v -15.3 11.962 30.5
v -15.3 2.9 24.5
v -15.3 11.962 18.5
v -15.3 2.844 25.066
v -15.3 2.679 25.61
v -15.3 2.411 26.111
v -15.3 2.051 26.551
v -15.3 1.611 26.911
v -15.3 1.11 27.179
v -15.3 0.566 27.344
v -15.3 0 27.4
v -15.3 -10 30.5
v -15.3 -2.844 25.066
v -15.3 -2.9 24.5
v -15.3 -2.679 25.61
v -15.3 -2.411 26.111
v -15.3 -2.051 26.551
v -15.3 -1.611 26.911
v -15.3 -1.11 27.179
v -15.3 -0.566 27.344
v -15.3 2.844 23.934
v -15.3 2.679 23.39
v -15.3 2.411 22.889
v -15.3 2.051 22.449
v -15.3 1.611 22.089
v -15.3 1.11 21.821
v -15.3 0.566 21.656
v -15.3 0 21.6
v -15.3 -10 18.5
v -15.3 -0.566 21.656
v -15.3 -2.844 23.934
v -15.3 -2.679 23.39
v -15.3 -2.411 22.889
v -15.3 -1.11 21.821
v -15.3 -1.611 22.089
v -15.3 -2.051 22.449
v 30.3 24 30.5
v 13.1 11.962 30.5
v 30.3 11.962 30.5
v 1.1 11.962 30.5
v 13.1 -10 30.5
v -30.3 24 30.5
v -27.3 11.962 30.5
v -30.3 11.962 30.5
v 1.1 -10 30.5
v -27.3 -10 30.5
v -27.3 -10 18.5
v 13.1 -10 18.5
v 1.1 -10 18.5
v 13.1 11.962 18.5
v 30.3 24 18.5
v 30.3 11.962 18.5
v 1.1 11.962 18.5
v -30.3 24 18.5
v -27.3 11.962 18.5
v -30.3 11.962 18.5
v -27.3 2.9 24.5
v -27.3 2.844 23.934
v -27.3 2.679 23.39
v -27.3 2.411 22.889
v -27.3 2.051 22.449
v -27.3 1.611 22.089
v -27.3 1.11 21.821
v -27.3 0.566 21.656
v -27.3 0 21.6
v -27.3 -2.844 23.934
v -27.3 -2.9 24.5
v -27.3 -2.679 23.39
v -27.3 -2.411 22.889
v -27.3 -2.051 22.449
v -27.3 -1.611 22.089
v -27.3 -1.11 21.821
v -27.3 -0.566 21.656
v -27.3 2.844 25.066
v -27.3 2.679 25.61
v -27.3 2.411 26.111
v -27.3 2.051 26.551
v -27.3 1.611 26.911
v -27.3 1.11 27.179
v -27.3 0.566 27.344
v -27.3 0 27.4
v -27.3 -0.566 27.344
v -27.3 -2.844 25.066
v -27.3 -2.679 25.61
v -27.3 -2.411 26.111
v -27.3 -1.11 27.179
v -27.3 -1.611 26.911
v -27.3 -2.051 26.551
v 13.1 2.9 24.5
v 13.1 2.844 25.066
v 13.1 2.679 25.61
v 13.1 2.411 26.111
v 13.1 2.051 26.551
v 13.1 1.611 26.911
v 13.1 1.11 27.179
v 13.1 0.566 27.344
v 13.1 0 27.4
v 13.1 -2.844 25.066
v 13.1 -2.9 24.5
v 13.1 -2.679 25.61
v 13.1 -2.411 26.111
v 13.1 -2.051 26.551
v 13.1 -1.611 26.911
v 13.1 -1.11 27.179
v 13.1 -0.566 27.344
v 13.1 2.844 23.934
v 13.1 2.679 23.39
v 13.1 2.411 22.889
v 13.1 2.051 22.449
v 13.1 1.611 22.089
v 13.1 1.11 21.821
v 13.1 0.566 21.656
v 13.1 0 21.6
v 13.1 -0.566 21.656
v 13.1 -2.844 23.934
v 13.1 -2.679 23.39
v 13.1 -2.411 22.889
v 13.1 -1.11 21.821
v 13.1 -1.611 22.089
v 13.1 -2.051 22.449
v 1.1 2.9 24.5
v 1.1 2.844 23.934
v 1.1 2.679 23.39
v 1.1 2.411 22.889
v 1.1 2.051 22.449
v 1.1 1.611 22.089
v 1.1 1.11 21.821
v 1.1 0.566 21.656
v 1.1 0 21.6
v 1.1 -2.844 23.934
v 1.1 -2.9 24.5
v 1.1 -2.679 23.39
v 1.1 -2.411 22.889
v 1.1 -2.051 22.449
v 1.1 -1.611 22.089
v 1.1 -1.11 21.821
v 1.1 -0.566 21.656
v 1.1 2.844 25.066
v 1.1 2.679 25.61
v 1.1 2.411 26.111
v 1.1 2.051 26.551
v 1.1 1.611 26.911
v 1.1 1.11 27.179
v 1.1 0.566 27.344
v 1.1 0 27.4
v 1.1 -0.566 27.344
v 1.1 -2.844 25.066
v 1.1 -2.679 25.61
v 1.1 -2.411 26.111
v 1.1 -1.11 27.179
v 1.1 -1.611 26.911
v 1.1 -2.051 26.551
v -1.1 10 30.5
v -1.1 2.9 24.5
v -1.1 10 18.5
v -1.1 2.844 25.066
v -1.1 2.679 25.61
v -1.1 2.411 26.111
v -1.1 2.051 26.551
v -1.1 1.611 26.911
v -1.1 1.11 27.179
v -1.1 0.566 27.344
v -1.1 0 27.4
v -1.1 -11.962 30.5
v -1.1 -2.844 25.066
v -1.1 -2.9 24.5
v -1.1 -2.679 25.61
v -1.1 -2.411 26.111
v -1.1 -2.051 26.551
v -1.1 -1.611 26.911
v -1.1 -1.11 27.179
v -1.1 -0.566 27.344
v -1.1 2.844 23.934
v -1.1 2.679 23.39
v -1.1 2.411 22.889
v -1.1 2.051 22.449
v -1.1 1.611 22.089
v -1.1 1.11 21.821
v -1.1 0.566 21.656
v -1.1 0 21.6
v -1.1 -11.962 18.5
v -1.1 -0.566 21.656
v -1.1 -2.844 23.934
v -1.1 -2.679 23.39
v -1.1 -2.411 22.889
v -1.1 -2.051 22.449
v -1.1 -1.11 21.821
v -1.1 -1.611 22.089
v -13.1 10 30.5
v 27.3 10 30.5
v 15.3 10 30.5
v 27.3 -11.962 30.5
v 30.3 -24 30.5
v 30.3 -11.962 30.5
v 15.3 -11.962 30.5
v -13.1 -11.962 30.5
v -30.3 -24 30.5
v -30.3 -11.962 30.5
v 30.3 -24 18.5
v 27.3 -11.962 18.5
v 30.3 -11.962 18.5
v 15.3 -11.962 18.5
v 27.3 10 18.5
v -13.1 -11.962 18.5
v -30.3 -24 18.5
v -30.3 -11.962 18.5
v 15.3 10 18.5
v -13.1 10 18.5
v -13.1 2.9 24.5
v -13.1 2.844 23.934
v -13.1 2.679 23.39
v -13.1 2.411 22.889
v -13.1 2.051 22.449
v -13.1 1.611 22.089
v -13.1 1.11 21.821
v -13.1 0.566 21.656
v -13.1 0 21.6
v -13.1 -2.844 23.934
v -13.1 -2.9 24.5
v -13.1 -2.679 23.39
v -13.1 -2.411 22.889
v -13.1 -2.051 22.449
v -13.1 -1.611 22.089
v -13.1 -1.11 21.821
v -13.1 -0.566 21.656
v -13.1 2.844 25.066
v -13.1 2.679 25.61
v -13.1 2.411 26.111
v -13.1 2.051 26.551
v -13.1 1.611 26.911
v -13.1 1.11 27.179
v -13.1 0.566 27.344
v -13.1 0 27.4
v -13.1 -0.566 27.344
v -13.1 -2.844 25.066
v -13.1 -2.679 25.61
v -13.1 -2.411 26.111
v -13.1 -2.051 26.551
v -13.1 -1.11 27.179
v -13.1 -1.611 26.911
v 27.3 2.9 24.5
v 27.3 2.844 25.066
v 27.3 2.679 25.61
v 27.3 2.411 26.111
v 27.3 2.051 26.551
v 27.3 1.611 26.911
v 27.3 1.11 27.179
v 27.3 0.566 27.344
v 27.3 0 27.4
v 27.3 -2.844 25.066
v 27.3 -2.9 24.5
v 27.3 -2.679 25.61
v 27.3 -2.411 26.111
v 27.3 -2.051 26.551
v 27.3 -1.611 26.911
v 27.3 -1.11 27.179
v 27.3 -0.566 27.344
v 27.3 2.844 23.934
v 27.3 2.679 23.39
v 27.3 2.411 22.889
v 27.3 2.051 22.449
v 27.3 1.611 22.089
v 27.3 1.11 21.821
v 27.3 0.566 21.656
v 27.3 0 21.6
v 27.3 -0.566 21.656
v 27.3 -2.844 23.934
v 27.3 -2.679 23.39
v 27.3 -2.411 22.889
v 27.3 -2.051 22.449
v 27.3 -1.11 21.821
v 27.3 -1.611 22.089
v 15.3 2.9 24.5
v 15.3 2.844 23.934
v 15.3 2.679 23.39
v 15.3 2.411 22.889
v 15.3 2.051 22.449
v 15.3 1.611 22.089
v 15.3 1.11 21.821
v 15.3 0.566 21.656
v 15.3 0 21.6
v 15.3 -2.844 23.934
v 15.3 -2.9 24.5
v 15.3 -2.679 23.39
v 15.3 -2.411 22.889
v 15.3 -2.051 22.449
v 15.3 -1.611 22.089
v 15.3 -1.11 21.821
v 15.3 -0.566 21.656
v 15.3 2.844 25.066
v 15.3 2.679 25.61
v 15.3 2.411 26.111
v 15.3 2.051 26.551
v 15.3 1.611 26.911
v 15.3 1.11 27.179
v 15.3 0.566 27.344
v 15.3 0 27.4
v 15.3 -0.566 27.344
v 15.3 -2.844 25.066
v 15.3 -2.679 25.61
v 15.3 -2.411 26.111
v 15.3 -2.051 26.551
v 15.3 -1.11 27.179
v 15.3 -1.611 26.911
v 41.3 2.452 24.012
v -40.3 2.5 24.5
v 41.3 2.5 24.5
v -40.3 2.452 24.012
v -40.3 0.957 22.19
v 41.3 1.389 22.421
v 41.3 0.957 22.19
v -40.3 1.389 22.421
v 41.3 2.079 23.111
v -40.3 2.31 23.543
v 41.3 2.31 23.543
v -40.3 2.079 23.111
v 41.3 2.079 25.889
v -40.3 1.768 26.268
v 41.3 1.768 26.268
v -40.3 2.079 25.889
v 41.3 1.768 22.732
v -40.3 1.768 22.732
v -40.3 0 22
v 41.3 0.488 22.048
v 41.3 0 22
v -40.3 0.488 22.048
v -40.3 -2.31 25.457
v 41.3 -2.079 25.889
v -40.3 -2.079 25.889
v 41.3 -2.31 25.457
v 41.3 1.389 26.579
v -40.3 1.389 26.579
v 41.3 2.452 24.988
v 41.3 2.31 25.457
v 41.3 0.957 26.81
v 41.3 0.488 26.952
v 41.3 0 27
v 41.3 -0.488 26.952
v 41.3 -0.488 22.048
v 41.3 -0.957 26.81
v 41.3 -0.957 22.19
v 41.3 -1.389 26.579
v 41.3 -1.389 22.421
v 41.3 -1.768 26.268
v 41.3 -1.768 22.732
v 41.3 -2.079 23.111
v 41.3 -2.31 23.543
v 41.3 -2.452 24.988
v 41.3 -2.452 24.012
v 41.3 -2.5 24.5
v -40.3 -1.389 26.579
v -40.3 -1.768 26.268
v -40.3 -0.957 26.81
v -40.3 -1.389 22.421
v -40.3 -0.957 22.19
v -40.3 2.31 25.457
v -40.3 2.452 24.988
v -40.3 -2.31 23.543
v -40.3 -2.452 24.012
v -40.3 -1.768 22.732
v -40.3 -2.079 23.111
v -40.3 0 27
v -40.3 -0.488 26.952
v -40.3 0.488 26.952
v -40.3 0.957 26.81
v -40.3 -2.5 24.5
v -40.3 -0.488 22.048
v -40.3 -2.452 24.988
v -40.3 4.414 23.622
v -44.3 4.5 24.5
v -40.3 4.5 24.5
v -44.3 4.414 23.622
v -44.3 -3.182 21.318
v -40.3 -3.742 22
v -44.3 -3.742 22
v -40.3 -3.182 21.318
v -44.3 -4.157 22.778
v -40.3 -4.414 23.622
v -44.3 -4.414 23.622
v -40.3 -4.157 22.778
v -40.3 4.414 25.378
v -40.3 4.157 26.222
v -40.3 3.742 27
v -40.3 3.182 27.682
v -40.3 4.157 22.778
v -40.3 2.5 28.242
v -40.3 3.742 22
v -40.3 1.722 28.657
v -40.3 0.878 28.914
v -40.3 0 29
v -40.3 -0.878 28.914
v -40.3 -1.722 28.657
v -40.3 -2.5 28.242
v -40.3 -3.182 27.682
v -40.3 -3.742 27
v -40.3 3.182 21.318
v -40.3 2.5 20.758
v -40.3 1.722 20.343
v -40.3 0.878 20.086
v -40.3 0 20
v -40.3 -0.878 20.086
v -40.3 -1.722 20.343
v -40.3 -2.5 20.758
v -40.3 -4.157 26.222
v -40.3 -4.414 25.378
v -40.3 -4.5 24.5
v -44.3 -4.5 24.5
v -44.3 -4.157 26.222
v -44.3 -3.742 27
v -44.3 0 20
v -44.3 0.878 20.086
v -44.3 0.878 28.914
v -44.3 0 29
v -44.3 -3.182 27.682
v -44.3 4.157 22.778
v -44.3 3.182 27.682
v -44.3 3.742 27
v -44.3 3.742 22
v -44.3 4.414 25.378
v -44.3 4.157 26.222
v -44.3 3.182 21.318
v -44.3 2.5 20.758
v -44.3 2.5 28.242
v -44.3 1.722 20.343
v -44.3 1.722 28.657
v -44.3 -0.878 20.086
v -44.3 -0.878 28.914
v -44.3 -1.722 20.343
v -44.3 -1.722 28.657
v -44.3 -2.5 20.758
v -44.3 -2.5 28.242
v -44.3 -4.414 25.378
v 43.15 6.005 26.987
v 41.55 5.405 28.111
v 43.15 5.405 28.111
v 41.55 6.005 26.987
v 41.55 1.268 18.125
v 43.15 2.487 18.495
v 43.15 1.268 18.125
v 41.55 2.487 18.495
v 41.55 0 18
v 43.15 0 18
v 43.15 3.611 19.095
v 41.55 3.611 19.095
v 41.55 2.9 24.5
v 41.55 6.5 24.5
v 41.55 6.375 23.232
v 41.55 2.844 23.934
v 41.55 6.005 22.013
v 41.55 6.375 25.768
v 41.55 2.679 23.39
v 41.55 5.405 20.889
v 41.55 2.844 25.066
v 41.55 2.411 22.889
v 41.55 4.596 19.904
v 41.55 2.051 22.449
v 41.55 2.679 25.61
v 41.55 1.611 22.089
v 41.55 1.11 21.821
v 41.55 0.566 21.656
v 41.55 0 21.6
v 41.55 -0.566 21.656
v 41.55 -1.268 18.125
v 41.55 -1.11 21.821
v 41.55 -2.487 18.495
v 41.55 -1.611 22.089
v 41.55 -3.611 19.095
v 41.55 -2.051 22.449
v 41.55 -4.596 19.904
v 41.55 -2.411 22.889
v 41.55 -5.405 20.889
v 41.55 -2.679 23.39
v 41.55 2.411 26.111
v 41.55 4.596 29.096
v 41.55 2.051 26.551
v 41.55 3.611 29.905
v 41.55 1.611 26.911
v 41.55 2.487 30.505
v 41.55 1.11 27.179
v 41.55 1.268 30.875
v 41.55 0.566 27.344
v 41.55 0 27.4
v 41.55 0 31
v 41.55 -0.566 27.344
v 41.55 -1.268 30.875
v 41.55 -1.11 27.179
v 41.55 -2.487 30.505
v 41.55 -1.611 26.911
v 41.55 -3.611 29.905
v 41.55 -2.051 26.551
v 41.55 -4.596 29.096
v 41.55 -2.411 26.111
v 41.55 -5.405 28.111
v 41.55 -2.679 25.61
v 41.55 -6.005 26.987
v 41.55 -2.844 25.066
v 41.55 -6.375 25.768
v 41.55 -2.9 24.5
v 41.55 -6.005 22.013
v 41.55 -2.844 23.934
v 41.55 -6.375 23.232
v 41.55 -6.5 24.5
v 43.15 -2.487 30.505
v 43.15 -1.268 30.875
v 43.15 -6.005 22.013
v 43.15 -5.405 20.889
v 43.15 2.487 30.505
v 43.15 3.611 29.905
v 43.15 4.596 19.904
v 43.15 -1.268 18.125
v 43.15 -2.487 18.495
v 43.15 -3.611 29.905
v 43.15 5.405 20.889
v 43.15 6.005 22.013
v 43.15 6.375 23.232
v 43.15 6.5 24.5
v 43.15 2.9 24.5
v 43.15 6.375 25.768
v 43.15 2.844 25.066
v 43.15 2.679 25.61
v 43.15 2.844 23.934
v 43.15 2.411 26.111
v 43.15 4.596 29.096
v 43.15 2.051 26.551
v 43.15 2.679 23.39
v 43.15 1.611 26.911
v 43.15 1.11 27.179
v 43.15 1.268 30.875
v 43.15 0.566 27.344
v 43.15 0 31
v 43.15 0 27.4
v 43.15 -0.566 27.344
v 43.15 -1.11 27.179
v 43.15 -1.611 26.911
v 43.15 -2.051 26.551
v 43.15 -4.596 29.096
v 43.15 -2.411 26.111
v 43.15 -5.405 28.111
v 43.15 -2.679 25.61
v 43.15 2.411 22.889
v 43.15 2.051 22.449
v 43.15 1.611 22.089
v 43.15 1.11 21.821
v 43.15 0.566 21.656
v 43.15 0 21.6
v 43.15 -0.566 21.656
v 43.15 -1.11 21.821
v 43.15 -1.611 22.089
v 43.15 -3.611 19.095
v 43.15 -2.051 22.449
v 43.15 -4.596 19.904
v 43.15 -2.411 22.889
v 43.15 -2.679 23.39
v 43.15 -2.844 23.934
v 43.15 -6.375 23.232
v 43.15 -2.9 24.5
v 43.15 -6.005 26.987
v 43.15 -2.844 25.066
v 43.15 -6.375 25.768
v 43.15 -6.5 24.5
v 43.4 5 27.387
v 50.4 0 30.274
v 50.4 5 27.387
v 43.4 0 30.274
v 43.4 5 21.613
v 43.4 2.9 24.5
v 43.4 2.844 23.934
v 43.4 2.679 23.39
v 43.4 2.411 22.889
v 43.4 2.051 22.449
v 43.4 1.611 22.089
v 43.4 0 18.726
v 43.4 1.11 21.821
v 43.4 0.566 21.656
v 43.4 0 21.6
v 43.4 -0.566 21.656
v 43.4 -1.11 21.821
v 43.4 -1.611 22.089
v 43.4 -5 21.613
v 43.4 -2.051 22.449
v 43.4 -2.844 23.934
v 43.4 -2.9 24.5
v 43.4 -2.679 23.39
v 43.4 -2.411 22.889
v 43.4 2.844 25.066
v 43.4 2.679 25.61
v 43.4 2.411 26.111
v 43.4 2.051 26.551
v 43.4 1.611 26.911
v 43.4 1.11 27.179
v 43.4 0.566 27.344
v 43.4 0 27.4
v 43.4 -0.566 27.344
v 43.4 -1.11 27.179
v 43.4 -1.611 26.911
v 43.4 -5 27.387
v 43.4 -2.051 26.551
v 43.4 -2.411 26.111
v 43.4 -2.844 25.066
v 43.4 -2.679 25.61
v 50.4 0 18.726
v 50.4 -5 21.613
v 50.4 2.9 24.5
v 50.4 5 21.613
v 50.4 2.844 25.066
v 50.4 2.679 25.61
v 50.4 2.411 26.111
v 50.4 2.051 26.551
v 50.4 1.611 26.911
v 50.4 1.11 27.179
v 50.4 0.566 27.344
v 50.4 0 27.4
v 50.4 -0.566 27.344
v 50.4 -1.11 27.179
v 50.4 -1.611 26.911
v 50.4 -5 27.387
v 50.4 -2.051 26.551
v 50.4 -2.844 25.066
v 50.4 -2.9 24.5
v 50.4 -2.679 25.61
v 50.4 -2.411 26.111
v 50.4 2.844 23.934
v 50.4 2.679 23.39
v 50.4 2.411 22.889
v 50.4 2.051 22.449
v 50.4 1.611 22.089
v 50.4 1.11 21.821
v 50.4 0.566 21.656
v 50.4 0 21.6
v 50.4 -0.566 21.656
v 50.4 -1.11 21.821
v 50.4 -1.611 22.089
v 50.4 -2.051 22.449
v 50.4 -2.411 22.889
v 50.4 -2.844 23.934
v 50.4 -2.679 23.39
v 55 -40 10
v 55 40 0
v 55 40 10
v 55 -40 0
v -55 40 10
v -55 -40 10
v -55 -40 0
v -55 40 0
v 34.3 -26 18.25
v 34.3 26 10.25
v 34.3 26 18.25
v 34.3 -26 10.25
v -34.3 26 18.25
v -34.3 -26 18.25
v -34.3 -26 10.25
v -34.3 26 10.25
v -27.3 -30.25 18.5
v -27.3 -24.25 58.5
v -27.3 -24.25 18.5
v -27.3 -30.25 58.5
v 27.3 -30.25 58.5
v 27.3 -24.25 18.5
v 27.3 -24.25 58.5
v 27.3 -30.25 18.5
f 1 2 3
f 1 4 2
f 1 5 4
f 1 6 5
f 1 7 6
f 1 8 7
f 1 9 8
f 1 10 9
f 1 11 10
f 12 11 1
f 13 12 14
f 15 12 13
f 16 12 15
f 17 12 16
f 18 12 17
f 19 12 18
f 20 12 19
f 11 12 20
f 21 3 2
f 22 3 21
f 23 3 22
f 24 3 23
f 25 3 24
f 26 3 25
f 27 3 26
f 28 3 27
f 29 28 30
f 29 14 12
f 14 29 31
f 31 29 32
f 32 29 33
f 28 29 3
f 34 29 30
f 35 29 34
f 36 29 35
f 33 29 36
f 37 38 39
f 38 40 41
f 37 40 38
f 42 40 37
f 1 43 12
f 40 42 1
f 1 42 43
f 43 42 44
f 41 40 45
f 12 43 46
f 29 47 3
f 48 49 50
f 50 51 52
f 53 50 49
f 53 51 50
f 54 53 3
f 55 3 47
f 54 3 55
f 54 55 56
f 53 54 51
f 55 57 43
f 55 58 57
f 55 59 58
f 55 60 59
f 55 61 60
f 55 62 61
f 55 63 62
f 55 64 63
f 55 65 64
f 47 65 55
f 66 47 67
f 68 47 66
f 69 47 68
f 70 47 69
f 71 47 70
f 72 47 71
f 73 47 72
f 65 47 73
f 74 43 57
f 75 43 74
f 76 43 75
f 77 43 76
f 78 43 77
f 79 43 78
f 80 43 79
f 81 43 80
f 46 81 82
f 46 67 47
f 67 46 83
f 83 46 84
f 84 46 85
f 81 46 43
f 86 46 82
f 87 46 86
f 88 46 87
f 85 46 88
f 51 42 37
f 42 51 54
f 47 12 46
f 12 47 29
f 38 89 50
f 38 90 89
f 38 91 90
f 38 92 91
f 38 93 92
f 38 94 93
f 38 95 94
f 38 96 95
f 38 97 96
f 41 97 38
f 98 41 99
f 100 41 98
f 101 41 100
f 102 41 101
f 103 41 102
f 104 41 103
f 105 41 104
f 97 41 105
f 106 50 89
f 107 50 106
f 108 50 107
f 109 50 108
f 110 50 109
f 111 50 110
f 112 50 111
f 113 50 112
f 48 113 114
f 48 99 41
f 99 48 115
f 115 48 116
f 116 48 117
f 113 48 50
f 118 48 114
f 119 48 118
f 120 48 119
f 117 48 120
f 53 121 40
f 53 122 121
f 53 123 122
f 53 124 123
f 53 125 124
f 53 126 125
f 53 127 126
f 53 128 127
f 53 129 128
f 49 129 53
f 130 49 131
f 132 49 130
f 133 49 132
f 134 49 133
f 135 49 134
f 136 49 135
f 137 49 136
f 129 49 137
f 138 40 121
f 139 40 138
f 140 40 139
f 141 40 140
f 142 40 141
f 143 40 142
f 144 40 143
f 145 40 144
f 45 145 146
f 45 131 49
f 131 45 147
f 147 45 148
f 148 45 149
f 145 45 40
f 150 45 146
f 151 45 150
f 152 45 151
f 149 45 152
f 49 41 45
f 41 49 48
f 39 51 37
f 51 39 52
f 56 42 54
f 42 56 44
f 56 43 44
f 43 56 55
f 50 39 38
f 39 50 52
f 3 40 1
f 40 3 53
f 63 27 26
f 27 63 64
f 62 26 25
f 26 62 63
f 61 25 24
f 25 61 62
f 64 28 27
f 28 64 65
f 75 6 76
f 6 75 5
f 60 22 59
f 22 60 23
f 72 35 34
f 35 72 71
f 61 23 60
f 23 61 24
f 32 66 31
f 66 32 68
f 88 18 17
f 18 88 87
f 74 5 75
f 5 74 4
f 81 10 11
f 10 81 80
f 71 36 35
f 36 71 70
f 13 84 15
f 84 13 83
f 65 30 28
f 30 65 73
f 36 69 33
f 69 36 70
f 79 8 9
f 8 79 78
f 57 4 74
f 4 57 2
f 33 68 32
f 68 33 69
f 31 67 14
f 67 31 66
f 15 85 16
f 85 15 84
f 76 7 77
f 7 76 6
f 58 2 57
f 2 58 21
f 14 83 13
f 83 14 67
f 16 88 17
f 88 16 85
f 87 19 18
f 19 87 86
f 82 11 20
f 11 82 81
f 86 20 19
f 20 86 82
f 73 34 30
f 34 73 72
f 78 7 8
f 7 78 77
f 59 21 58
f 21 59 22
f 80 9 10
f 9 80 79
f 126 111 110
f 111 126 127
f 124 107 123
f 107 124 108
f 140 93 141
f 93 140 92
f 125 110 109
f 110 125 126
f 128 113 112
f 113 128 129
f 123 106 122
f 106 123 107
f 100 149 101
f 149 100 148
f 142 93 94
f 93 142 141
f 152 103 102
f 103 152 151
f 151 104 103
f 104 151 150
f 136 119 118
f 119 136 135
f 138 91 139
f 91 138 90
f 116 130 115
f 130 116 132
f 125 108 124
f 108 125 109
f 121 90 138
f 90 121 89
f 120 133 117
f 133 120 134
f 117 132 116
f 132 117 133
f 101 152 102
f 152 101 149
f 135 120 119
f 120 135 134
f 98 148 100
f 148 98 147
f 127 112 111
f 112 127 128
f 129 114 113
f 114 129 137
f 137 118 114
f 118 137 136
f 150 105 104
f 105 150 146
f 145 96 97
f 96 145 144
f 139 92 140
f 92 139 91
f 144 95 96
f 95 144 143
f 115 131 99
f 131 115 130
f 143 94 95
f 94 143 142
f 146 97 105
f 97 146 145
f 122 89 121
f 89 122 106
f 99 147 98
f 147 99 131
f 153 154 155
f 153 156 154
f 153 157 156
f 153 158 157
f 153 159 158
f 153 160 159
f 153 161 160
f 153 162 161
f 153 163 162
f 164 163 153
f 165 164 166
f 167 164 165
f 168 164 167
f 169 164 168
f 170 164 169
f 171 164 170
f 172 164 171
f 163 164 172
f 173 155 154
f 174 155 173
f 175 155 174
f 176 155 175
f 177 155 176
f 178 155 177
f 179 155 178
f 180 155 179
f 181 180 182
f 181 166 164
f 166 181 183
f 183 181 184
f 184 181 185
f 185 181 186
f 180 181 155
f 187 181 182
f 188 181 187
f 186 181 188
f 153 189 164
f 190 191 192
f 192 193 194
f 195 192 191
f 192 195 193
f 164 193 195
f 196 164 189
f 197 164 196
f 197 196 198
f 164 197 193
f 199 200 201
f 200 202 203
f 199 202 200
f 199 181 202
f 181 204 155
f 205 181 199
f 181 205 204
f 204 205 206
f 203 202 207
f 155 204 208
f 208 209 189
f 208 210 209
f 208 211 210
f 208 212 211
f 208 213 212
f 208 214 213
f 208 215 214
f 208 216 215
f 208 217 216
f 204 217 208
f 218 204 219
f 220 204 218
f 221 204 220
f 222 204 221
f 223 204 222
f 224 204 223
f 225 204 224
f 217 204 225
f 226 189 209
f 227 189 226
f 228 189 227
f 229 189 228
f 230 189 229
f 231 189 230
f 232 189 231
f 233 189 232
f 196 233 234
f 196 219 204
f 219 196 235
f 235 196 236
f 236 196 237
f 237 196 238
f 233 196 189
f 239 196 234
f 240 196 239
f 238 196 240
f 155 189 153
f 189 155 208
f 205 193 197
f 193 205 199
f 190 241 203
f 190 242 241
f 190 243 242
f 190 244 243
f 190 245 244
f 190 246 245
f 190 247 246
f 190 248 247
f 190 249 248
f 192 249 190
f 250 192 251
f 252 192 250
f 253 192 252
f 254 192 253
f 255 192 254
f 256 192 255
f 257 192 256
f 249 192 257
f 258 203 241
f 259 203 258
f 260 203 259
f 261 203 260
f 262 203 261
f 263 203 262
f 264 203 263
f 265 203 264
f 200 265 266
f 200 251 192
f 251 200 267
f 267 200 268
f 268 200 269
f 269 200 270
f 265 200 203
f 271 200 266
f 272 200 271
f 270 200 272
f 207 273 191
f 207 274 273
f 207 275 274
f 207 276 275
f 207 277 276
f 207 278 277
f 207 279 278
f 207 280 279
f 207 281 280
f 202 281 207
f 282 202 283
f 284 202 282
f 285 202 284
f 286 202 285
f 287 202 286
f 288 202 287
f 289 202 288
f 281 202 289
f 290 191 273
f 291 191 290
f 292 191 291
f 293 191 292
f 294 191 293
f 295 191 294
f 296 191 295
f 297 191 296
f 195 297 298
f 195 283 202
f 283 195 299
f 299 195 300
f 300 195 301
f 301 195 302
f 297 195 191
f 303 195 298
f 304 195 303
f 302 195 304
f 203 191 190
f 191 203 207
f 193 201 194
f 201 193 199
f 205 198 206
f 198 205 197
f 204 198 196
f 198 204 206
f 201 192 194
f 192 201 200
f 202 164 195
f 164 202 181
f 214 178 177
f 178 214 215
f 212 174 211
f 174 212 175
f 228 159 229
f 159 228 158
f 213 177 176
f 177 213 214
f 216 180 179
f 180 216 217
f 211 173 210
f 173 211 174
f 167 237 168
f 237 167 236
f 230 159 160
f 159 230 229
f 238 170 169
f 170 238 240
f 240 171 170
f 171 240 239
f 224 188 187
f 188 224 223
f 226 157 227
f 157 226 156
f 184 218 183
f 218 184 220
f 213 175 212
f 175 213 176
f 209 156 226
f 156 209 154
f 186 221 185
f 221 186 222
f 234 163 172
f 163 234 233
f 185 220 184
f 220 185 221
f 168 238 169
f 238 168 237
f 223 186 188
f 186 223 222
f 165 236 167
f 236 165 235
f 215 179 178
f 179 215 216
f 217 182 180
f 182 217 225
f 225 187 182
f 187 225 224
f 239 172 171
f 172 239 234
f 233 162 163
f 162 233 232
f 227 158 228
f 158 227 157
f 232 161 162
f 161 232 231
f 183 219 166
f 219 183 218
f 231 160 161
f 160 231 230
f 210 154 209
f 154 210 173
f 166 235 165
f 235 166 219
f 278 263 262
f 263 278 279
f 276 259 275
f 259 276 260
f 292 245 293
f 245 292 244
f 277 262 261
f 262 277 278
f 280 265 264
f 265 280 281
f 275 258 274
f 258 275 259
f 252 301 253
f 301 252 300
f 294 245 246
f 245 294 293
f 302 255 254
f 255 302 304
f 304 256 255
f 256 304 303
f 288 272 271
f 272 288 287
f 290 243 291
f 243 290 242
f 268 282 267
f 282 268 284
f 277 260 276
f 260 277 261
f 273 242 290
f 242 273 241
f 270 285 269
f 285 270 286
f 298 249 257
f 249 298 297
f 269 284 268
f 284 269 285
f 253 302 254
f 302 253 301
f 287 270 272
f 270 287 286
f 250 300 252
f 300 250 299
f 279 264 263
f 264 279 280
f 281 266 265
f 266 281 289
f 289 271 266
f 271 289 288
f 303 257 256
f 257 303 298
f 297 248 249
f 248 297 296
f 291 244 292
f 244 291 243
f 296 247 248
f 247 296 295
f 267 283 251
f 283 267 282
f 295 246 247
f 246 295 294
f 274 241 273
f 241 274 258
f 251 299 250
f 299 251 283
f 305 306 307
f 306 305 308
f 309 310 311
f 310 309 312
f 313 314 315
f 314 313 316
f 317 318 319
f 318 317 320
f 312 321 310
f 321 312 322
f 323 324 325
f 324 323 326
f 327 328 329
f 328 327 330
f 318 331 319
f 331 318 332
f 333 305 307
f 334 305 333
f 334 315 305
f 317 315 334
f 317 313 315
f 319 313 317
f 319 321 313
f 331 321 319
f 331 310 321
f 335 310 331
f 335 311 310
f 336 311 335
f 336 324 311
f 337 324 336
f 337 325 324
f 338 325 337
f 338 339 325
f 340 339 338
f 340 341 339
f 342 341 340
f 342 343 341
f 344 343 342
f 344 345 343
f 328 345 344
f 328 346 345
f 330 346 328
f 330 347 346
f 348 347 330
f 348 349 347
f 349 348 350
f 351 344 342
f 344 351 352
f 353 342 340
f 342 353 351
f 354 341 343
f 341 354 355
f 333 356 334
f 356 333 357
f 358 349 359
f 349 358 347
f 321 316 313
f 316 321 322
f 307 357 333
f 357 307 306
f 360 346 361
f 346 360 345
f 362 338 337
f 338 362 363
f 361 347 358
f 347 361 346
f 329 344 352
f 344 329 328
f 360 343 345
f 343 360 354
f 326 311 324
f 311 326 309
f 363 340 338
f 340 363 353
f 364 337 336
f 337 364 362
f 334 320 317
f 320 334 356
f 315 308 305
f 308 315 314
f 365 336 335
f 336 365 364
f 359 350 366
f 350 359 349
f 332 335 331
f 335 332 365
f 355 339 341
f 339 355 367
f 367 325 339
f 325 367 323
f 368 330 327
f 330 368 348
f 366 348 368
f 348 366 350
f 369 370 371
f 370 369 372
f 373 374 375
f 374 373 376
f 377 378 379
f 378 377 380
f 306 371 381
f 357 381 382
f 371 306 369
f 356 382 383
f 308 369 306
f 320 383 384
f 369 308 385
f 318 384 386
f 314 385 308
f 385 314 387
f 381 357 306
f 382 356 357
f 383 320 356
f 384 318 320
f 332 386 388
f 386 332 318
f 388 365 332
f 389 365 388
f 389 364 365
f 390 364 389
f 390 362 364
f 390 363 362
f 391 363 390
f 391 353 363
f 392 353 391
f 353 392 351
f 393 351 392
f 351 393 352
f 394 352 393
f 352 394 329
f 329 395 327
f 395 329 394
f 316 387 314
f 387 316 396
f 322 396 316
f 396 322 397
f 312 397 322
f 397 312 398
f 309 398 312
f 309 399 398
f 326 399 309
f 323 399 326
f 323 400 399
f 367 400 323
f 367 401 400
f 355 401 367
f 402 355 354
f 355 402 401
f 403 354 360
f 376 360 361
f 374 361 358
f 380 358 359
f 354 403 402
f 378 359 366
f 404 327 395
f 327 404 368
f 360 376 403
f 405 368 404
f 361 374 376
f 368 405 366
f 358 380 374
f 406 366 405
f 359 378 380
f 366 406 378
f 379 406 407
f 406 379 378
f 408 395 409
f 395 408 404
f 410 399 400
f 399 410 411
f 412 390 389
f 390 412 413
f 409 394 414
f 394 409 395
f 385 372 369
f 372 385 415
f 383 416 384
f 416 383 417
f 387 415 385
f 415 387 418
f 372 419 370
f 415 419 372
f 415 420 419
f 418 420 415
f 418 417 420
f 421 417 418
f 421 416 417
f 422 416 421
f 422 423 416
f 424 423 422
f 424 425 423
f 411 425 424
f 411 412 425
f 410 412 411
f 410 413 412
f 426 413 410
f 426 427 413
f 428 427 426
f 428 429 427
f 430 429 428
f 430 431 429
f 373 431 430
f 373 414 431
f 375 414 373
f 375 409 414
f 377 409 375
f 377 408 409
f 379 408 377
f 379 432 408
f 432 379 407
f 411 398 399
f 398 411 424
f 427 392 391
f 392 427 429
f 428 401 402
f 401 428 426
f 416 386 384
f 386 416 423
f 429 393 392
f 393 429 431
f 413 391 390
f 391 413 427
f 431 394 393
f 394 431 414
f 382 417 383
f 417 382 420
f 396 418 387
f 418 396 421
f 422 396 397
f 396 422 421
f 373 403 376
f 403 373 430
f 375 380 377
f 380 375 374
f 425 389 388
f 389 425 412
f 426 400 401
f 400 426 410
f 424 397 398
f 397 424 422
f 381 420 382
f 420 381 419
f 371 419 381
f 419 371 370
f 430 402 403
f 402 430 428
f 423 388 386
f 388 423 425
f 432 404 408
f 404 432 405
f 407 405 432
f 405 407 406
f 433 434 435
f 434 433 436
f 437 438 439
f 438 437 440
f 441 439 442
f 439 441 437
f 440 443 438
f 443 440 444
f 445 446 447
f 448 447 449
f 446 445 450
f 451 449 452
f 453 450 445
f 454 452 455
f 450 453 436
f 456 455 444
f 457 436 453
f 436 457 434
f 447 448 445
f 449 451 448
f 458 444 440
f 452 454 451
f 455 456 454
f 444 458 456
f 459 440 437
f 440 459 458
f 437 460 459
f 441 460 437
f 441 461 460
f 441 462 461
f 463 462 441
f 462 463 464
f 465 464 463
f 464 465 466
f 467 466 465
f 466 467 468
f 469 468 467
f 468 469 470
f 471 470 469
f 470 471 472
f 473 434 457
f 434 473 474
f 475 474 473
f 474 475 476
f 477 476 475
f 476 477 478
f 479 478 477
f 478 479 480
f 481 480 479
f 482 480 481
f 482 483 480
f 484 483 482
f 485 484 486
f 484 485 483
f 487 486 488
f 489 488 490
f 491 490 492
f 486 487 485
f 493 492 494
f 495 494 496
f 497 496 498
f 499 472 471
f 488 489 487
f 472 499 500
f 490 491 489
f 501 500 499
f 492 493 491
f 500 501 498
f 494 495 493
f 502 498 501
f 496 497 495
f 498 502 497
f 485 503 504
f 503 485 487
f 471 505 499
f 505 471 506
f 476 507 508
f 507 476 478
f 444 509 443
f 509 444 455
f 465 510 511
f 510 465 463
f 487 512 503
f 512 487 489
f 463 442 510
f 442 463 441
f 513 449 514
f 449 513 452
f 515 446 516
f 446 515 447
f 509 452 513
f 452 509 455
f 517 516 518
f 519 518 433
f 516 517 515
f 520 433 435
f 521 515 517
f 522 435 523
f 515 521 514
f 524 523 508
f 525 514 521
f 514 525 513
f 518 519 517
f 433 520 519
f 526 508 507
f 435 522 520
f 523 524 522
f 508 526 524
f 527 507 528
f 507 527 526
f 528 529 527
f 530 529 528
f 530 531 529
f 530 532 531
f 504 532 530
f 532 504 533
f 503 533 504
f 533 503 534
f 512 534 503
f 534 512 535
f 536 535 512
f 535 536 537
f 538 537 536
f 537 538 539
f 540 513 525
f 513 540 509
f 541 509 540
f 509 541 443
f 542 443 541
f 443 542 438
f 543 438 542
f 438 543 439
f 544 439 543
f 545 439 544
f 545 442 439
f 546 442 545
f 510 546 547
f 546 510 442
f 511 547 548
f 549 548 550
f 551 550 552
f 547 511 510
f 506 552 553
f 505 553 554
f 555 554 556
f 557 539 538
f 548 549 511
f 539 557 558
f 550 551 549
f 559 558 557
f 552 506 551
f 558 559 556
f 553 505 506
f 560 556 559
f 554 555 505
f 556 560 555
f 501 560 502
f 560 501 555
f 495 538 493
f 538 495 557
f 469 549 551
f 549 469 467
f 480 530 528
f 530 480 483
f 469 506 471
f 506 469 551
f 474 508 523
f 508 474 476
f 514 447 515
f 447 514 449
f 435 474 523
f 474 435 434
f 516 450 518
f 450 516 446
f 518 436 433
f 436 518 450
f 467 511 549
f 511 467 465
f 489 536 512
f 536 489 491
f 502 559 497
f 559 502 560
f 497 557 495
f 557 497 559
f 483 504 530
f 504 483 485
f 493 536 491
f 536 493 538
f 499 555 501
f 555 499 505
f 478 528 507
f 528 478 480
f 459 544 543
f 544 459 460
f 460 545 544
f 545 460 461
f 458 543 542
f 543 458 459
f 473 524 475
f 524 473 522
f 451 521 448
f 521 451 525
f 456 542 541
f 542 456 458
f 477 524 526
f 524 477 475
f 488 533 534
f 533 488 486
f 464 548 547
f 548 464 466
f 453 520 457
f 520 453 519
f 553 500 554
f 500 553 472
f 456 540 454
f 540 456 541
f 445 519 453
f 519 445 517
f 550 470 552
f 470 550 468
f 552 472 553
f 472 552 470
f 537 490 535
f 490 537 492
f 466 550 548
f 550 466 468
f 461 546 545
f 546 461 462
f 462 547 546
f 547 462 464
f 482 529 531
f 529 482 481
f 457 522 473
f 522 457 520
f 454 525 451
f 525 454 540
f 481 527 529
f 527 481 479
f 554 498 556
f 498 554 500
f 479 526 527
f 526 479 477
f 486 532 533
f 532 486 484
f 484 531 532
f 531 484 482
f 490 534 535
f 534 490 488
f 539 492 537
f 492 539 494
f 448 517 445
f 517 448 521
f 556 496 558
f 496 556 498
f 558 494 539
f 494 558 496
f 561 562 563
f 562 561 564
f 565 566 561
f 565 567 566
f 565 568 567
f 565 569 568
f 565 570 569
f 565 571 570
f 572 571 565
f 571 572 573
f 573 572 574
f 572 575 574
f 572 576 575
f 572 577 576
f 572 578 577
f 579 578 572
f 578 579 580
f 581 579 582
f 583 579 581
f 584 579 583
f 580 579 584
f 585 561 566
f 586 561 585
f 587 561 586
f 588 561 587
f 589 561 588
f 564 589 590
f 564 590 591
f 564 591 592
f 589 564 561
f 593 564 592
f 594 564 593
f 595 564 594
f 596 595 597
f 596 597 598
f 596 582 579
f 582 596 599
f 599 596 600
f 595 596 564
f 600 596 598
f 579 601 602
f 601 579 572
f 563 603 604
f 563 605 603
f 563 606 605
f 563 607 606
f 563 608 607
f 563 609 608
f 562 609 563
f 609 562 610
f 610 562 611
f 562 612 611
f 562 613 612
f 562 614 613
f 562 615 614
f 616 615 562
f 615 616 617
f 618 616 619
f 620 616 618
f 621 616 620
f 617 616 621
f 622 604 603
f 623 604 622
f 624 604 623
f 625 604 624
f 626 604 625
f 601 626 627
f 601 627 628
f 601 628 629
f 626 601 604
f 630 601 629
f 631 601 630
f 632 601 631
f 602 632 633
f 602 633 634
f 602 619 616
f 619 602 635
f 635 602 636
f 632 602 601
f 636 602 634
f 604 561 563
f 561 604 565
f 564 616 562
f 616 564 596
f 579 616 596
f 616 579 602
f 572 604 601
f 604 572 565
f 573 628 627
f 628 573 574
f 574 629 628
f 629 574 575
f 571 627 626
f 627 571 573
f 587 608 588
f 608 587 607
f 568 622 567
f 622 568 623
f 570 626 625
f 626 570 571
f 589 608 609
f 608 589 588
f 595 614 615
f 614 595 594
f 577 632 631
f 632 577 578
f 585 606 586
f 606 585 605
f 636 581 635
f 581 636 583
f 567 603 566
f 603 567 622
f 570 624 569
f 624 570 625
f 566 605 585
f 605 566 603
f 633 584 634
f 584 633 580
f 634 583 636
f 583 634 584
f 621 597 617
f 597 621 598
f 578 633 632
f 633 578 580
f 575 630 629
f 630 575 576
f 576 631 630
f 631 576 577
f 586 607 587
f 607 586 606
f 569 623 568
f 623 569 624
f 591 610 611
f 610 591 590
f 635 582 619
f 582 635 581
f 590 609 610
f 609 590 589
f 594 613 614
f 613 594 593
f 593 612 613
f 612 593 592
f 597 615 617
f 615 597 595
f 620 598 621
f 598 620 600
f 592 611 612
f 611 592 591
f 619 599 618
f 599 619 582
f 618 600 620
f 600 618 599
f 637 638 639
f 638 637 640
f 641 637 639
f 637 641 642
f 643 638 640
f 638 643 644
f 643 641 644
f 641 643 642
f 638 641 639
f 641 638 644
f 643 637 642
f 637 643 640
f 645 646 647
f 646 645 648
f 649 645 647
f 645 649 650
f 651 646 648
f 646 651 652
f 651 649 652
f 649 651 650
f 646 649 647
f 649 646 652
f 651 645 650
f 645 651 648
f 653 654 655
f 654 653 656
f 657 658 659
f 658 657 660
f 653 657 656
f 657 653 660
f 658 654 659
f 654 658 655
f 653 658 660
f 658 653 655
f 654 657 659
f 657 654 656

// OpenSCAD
$fn = 32;

// ------------------------------------------------------------------------
// Comb hinge with flap: leaf 60.6 x 24 mm, pin d5, flap 40 mm
// Every part is its own module, assembly() places every instance.
// ------------------------------------------------------------------------

// --- part 1 ---
module hinge_bed() {
  difference() {
    translate([-55, -40, 0]) cube([110, 80, 10]);
  }
}

// --- part 2 ---
module hinge_riser() {
  difference() {
    translate([-34.3, -26, 0]) cube([68.6, 52, 8]);
  }
}

// --- part 3 ---
module hinge_leaf_a() {
  difference() {
    union() {
      translate([-27.3, -10, -6]) cube([12, 34, 12]);
      translate([1.1, -10, -6]) cube([12, 34, 12]);
      translate([-30.3, 11.962, -6]) cube([60.6, 12.038, 12]);
    }
    translate([-21.3, 0, 0]) rotate([0, 90, 0]) cylinder(h = 14, d = 5.8, center = true);
    translate([7.1, 0, 0]) rotate([0, 90, 0]) cylinder(h = 14, d = 5.8, center = true);
  }
}

// --- part 4 ---
module hinge_leaf_b() {
  difference() {
    union() {
      translate([-13.1, -24, -6]) cube([12, 34, 12]);
      translate([15.3, -24, -6]) cube([12, 34, 12]);
      translate([-30.3, -24, -6]) cube([60.6, 12.038, 12]);
    }
    translate([-7.1, 0, 0]) rotate([0, 90, 0]) cylinder(h = 14, d = 5.8, center = true);
    translate([21.3, 0, 0]) rotate([0, 90, 0]) cylinder(h = 14, d = 5.8, center = true);
  }
}

// --- part 5 ---
module hinge_flap() {
  difference() {
    translate([-27.3, -20, 0]) cube([54.6, 40, 6]);
  }
}

// --- part 6 ---
module hinge_pin() {
  rotate([0, 90, 0]) cylinder(h = 82.6, d = 5, center = true);
  translate([-44.3, 0, 0]) rotate([0, 90, 0]) cylinder(h = 4, d = 9);
}

// --- part 7 ---
module pin_washer() {
  difference() {
      translate([0, 0, 0]) cylinder(h = 1.6, d = 13);
      translate([0, 0, -1]) cylinder(h = 3.6, d = 5.8);
    }
}

// --- part 8 ---
module pin_nut() {
  difference() {
    linear_extrude(height = 7) polygon(points = [[5.774, 0], [2.887, 5], [-2.887, 5], [-5.774, 0], [-2.887, -5], [2.887, -5]]);
    translate([0, 0, -1]) cylinder(h = 9, d = 5.8);
  }
}

// --- assembly ---
module assembly() {
  color([0.80, 0.24, 0.20]) translate([0, 0, 0]) rotate([0, 0, 0]) hinge_bed();
  color([0.20, 0.45, 0.75]) translate([0, 0, 10.25]) rotate([0, 0, 0]) hinge_riser();
  color([0.25, 0.62, 0.32]) translate([0, 0, 24.5]) rotate([0, 0, 0]) hinge_leaf_a();
  color([0.92, 0.70, 0.18]) translate([0, 0, 24.5]) rotate([0, 0, 0]) hinge_leaf_b();
  color([0.58, 0.35, 0.70]) translate([0, -24.25, 38.5]) rotate([90, 0, 0]) hinge_flap();
  color([0.16, 0.66, 0.66]) translate([0, 0, 24.5]) rotate([0, 0, 0]) hinge_pin();
  color([0.85, 0.48, 0.18]) translate([41.55, 0, 24.5]) rotate([0, 90, 0]) pin_washer();
  color([0.55, 0.60, 0.65]) translate([43.4, 0, 24.5]) rotate([0, 90, 0]) pin_nut();
}

assembly();
